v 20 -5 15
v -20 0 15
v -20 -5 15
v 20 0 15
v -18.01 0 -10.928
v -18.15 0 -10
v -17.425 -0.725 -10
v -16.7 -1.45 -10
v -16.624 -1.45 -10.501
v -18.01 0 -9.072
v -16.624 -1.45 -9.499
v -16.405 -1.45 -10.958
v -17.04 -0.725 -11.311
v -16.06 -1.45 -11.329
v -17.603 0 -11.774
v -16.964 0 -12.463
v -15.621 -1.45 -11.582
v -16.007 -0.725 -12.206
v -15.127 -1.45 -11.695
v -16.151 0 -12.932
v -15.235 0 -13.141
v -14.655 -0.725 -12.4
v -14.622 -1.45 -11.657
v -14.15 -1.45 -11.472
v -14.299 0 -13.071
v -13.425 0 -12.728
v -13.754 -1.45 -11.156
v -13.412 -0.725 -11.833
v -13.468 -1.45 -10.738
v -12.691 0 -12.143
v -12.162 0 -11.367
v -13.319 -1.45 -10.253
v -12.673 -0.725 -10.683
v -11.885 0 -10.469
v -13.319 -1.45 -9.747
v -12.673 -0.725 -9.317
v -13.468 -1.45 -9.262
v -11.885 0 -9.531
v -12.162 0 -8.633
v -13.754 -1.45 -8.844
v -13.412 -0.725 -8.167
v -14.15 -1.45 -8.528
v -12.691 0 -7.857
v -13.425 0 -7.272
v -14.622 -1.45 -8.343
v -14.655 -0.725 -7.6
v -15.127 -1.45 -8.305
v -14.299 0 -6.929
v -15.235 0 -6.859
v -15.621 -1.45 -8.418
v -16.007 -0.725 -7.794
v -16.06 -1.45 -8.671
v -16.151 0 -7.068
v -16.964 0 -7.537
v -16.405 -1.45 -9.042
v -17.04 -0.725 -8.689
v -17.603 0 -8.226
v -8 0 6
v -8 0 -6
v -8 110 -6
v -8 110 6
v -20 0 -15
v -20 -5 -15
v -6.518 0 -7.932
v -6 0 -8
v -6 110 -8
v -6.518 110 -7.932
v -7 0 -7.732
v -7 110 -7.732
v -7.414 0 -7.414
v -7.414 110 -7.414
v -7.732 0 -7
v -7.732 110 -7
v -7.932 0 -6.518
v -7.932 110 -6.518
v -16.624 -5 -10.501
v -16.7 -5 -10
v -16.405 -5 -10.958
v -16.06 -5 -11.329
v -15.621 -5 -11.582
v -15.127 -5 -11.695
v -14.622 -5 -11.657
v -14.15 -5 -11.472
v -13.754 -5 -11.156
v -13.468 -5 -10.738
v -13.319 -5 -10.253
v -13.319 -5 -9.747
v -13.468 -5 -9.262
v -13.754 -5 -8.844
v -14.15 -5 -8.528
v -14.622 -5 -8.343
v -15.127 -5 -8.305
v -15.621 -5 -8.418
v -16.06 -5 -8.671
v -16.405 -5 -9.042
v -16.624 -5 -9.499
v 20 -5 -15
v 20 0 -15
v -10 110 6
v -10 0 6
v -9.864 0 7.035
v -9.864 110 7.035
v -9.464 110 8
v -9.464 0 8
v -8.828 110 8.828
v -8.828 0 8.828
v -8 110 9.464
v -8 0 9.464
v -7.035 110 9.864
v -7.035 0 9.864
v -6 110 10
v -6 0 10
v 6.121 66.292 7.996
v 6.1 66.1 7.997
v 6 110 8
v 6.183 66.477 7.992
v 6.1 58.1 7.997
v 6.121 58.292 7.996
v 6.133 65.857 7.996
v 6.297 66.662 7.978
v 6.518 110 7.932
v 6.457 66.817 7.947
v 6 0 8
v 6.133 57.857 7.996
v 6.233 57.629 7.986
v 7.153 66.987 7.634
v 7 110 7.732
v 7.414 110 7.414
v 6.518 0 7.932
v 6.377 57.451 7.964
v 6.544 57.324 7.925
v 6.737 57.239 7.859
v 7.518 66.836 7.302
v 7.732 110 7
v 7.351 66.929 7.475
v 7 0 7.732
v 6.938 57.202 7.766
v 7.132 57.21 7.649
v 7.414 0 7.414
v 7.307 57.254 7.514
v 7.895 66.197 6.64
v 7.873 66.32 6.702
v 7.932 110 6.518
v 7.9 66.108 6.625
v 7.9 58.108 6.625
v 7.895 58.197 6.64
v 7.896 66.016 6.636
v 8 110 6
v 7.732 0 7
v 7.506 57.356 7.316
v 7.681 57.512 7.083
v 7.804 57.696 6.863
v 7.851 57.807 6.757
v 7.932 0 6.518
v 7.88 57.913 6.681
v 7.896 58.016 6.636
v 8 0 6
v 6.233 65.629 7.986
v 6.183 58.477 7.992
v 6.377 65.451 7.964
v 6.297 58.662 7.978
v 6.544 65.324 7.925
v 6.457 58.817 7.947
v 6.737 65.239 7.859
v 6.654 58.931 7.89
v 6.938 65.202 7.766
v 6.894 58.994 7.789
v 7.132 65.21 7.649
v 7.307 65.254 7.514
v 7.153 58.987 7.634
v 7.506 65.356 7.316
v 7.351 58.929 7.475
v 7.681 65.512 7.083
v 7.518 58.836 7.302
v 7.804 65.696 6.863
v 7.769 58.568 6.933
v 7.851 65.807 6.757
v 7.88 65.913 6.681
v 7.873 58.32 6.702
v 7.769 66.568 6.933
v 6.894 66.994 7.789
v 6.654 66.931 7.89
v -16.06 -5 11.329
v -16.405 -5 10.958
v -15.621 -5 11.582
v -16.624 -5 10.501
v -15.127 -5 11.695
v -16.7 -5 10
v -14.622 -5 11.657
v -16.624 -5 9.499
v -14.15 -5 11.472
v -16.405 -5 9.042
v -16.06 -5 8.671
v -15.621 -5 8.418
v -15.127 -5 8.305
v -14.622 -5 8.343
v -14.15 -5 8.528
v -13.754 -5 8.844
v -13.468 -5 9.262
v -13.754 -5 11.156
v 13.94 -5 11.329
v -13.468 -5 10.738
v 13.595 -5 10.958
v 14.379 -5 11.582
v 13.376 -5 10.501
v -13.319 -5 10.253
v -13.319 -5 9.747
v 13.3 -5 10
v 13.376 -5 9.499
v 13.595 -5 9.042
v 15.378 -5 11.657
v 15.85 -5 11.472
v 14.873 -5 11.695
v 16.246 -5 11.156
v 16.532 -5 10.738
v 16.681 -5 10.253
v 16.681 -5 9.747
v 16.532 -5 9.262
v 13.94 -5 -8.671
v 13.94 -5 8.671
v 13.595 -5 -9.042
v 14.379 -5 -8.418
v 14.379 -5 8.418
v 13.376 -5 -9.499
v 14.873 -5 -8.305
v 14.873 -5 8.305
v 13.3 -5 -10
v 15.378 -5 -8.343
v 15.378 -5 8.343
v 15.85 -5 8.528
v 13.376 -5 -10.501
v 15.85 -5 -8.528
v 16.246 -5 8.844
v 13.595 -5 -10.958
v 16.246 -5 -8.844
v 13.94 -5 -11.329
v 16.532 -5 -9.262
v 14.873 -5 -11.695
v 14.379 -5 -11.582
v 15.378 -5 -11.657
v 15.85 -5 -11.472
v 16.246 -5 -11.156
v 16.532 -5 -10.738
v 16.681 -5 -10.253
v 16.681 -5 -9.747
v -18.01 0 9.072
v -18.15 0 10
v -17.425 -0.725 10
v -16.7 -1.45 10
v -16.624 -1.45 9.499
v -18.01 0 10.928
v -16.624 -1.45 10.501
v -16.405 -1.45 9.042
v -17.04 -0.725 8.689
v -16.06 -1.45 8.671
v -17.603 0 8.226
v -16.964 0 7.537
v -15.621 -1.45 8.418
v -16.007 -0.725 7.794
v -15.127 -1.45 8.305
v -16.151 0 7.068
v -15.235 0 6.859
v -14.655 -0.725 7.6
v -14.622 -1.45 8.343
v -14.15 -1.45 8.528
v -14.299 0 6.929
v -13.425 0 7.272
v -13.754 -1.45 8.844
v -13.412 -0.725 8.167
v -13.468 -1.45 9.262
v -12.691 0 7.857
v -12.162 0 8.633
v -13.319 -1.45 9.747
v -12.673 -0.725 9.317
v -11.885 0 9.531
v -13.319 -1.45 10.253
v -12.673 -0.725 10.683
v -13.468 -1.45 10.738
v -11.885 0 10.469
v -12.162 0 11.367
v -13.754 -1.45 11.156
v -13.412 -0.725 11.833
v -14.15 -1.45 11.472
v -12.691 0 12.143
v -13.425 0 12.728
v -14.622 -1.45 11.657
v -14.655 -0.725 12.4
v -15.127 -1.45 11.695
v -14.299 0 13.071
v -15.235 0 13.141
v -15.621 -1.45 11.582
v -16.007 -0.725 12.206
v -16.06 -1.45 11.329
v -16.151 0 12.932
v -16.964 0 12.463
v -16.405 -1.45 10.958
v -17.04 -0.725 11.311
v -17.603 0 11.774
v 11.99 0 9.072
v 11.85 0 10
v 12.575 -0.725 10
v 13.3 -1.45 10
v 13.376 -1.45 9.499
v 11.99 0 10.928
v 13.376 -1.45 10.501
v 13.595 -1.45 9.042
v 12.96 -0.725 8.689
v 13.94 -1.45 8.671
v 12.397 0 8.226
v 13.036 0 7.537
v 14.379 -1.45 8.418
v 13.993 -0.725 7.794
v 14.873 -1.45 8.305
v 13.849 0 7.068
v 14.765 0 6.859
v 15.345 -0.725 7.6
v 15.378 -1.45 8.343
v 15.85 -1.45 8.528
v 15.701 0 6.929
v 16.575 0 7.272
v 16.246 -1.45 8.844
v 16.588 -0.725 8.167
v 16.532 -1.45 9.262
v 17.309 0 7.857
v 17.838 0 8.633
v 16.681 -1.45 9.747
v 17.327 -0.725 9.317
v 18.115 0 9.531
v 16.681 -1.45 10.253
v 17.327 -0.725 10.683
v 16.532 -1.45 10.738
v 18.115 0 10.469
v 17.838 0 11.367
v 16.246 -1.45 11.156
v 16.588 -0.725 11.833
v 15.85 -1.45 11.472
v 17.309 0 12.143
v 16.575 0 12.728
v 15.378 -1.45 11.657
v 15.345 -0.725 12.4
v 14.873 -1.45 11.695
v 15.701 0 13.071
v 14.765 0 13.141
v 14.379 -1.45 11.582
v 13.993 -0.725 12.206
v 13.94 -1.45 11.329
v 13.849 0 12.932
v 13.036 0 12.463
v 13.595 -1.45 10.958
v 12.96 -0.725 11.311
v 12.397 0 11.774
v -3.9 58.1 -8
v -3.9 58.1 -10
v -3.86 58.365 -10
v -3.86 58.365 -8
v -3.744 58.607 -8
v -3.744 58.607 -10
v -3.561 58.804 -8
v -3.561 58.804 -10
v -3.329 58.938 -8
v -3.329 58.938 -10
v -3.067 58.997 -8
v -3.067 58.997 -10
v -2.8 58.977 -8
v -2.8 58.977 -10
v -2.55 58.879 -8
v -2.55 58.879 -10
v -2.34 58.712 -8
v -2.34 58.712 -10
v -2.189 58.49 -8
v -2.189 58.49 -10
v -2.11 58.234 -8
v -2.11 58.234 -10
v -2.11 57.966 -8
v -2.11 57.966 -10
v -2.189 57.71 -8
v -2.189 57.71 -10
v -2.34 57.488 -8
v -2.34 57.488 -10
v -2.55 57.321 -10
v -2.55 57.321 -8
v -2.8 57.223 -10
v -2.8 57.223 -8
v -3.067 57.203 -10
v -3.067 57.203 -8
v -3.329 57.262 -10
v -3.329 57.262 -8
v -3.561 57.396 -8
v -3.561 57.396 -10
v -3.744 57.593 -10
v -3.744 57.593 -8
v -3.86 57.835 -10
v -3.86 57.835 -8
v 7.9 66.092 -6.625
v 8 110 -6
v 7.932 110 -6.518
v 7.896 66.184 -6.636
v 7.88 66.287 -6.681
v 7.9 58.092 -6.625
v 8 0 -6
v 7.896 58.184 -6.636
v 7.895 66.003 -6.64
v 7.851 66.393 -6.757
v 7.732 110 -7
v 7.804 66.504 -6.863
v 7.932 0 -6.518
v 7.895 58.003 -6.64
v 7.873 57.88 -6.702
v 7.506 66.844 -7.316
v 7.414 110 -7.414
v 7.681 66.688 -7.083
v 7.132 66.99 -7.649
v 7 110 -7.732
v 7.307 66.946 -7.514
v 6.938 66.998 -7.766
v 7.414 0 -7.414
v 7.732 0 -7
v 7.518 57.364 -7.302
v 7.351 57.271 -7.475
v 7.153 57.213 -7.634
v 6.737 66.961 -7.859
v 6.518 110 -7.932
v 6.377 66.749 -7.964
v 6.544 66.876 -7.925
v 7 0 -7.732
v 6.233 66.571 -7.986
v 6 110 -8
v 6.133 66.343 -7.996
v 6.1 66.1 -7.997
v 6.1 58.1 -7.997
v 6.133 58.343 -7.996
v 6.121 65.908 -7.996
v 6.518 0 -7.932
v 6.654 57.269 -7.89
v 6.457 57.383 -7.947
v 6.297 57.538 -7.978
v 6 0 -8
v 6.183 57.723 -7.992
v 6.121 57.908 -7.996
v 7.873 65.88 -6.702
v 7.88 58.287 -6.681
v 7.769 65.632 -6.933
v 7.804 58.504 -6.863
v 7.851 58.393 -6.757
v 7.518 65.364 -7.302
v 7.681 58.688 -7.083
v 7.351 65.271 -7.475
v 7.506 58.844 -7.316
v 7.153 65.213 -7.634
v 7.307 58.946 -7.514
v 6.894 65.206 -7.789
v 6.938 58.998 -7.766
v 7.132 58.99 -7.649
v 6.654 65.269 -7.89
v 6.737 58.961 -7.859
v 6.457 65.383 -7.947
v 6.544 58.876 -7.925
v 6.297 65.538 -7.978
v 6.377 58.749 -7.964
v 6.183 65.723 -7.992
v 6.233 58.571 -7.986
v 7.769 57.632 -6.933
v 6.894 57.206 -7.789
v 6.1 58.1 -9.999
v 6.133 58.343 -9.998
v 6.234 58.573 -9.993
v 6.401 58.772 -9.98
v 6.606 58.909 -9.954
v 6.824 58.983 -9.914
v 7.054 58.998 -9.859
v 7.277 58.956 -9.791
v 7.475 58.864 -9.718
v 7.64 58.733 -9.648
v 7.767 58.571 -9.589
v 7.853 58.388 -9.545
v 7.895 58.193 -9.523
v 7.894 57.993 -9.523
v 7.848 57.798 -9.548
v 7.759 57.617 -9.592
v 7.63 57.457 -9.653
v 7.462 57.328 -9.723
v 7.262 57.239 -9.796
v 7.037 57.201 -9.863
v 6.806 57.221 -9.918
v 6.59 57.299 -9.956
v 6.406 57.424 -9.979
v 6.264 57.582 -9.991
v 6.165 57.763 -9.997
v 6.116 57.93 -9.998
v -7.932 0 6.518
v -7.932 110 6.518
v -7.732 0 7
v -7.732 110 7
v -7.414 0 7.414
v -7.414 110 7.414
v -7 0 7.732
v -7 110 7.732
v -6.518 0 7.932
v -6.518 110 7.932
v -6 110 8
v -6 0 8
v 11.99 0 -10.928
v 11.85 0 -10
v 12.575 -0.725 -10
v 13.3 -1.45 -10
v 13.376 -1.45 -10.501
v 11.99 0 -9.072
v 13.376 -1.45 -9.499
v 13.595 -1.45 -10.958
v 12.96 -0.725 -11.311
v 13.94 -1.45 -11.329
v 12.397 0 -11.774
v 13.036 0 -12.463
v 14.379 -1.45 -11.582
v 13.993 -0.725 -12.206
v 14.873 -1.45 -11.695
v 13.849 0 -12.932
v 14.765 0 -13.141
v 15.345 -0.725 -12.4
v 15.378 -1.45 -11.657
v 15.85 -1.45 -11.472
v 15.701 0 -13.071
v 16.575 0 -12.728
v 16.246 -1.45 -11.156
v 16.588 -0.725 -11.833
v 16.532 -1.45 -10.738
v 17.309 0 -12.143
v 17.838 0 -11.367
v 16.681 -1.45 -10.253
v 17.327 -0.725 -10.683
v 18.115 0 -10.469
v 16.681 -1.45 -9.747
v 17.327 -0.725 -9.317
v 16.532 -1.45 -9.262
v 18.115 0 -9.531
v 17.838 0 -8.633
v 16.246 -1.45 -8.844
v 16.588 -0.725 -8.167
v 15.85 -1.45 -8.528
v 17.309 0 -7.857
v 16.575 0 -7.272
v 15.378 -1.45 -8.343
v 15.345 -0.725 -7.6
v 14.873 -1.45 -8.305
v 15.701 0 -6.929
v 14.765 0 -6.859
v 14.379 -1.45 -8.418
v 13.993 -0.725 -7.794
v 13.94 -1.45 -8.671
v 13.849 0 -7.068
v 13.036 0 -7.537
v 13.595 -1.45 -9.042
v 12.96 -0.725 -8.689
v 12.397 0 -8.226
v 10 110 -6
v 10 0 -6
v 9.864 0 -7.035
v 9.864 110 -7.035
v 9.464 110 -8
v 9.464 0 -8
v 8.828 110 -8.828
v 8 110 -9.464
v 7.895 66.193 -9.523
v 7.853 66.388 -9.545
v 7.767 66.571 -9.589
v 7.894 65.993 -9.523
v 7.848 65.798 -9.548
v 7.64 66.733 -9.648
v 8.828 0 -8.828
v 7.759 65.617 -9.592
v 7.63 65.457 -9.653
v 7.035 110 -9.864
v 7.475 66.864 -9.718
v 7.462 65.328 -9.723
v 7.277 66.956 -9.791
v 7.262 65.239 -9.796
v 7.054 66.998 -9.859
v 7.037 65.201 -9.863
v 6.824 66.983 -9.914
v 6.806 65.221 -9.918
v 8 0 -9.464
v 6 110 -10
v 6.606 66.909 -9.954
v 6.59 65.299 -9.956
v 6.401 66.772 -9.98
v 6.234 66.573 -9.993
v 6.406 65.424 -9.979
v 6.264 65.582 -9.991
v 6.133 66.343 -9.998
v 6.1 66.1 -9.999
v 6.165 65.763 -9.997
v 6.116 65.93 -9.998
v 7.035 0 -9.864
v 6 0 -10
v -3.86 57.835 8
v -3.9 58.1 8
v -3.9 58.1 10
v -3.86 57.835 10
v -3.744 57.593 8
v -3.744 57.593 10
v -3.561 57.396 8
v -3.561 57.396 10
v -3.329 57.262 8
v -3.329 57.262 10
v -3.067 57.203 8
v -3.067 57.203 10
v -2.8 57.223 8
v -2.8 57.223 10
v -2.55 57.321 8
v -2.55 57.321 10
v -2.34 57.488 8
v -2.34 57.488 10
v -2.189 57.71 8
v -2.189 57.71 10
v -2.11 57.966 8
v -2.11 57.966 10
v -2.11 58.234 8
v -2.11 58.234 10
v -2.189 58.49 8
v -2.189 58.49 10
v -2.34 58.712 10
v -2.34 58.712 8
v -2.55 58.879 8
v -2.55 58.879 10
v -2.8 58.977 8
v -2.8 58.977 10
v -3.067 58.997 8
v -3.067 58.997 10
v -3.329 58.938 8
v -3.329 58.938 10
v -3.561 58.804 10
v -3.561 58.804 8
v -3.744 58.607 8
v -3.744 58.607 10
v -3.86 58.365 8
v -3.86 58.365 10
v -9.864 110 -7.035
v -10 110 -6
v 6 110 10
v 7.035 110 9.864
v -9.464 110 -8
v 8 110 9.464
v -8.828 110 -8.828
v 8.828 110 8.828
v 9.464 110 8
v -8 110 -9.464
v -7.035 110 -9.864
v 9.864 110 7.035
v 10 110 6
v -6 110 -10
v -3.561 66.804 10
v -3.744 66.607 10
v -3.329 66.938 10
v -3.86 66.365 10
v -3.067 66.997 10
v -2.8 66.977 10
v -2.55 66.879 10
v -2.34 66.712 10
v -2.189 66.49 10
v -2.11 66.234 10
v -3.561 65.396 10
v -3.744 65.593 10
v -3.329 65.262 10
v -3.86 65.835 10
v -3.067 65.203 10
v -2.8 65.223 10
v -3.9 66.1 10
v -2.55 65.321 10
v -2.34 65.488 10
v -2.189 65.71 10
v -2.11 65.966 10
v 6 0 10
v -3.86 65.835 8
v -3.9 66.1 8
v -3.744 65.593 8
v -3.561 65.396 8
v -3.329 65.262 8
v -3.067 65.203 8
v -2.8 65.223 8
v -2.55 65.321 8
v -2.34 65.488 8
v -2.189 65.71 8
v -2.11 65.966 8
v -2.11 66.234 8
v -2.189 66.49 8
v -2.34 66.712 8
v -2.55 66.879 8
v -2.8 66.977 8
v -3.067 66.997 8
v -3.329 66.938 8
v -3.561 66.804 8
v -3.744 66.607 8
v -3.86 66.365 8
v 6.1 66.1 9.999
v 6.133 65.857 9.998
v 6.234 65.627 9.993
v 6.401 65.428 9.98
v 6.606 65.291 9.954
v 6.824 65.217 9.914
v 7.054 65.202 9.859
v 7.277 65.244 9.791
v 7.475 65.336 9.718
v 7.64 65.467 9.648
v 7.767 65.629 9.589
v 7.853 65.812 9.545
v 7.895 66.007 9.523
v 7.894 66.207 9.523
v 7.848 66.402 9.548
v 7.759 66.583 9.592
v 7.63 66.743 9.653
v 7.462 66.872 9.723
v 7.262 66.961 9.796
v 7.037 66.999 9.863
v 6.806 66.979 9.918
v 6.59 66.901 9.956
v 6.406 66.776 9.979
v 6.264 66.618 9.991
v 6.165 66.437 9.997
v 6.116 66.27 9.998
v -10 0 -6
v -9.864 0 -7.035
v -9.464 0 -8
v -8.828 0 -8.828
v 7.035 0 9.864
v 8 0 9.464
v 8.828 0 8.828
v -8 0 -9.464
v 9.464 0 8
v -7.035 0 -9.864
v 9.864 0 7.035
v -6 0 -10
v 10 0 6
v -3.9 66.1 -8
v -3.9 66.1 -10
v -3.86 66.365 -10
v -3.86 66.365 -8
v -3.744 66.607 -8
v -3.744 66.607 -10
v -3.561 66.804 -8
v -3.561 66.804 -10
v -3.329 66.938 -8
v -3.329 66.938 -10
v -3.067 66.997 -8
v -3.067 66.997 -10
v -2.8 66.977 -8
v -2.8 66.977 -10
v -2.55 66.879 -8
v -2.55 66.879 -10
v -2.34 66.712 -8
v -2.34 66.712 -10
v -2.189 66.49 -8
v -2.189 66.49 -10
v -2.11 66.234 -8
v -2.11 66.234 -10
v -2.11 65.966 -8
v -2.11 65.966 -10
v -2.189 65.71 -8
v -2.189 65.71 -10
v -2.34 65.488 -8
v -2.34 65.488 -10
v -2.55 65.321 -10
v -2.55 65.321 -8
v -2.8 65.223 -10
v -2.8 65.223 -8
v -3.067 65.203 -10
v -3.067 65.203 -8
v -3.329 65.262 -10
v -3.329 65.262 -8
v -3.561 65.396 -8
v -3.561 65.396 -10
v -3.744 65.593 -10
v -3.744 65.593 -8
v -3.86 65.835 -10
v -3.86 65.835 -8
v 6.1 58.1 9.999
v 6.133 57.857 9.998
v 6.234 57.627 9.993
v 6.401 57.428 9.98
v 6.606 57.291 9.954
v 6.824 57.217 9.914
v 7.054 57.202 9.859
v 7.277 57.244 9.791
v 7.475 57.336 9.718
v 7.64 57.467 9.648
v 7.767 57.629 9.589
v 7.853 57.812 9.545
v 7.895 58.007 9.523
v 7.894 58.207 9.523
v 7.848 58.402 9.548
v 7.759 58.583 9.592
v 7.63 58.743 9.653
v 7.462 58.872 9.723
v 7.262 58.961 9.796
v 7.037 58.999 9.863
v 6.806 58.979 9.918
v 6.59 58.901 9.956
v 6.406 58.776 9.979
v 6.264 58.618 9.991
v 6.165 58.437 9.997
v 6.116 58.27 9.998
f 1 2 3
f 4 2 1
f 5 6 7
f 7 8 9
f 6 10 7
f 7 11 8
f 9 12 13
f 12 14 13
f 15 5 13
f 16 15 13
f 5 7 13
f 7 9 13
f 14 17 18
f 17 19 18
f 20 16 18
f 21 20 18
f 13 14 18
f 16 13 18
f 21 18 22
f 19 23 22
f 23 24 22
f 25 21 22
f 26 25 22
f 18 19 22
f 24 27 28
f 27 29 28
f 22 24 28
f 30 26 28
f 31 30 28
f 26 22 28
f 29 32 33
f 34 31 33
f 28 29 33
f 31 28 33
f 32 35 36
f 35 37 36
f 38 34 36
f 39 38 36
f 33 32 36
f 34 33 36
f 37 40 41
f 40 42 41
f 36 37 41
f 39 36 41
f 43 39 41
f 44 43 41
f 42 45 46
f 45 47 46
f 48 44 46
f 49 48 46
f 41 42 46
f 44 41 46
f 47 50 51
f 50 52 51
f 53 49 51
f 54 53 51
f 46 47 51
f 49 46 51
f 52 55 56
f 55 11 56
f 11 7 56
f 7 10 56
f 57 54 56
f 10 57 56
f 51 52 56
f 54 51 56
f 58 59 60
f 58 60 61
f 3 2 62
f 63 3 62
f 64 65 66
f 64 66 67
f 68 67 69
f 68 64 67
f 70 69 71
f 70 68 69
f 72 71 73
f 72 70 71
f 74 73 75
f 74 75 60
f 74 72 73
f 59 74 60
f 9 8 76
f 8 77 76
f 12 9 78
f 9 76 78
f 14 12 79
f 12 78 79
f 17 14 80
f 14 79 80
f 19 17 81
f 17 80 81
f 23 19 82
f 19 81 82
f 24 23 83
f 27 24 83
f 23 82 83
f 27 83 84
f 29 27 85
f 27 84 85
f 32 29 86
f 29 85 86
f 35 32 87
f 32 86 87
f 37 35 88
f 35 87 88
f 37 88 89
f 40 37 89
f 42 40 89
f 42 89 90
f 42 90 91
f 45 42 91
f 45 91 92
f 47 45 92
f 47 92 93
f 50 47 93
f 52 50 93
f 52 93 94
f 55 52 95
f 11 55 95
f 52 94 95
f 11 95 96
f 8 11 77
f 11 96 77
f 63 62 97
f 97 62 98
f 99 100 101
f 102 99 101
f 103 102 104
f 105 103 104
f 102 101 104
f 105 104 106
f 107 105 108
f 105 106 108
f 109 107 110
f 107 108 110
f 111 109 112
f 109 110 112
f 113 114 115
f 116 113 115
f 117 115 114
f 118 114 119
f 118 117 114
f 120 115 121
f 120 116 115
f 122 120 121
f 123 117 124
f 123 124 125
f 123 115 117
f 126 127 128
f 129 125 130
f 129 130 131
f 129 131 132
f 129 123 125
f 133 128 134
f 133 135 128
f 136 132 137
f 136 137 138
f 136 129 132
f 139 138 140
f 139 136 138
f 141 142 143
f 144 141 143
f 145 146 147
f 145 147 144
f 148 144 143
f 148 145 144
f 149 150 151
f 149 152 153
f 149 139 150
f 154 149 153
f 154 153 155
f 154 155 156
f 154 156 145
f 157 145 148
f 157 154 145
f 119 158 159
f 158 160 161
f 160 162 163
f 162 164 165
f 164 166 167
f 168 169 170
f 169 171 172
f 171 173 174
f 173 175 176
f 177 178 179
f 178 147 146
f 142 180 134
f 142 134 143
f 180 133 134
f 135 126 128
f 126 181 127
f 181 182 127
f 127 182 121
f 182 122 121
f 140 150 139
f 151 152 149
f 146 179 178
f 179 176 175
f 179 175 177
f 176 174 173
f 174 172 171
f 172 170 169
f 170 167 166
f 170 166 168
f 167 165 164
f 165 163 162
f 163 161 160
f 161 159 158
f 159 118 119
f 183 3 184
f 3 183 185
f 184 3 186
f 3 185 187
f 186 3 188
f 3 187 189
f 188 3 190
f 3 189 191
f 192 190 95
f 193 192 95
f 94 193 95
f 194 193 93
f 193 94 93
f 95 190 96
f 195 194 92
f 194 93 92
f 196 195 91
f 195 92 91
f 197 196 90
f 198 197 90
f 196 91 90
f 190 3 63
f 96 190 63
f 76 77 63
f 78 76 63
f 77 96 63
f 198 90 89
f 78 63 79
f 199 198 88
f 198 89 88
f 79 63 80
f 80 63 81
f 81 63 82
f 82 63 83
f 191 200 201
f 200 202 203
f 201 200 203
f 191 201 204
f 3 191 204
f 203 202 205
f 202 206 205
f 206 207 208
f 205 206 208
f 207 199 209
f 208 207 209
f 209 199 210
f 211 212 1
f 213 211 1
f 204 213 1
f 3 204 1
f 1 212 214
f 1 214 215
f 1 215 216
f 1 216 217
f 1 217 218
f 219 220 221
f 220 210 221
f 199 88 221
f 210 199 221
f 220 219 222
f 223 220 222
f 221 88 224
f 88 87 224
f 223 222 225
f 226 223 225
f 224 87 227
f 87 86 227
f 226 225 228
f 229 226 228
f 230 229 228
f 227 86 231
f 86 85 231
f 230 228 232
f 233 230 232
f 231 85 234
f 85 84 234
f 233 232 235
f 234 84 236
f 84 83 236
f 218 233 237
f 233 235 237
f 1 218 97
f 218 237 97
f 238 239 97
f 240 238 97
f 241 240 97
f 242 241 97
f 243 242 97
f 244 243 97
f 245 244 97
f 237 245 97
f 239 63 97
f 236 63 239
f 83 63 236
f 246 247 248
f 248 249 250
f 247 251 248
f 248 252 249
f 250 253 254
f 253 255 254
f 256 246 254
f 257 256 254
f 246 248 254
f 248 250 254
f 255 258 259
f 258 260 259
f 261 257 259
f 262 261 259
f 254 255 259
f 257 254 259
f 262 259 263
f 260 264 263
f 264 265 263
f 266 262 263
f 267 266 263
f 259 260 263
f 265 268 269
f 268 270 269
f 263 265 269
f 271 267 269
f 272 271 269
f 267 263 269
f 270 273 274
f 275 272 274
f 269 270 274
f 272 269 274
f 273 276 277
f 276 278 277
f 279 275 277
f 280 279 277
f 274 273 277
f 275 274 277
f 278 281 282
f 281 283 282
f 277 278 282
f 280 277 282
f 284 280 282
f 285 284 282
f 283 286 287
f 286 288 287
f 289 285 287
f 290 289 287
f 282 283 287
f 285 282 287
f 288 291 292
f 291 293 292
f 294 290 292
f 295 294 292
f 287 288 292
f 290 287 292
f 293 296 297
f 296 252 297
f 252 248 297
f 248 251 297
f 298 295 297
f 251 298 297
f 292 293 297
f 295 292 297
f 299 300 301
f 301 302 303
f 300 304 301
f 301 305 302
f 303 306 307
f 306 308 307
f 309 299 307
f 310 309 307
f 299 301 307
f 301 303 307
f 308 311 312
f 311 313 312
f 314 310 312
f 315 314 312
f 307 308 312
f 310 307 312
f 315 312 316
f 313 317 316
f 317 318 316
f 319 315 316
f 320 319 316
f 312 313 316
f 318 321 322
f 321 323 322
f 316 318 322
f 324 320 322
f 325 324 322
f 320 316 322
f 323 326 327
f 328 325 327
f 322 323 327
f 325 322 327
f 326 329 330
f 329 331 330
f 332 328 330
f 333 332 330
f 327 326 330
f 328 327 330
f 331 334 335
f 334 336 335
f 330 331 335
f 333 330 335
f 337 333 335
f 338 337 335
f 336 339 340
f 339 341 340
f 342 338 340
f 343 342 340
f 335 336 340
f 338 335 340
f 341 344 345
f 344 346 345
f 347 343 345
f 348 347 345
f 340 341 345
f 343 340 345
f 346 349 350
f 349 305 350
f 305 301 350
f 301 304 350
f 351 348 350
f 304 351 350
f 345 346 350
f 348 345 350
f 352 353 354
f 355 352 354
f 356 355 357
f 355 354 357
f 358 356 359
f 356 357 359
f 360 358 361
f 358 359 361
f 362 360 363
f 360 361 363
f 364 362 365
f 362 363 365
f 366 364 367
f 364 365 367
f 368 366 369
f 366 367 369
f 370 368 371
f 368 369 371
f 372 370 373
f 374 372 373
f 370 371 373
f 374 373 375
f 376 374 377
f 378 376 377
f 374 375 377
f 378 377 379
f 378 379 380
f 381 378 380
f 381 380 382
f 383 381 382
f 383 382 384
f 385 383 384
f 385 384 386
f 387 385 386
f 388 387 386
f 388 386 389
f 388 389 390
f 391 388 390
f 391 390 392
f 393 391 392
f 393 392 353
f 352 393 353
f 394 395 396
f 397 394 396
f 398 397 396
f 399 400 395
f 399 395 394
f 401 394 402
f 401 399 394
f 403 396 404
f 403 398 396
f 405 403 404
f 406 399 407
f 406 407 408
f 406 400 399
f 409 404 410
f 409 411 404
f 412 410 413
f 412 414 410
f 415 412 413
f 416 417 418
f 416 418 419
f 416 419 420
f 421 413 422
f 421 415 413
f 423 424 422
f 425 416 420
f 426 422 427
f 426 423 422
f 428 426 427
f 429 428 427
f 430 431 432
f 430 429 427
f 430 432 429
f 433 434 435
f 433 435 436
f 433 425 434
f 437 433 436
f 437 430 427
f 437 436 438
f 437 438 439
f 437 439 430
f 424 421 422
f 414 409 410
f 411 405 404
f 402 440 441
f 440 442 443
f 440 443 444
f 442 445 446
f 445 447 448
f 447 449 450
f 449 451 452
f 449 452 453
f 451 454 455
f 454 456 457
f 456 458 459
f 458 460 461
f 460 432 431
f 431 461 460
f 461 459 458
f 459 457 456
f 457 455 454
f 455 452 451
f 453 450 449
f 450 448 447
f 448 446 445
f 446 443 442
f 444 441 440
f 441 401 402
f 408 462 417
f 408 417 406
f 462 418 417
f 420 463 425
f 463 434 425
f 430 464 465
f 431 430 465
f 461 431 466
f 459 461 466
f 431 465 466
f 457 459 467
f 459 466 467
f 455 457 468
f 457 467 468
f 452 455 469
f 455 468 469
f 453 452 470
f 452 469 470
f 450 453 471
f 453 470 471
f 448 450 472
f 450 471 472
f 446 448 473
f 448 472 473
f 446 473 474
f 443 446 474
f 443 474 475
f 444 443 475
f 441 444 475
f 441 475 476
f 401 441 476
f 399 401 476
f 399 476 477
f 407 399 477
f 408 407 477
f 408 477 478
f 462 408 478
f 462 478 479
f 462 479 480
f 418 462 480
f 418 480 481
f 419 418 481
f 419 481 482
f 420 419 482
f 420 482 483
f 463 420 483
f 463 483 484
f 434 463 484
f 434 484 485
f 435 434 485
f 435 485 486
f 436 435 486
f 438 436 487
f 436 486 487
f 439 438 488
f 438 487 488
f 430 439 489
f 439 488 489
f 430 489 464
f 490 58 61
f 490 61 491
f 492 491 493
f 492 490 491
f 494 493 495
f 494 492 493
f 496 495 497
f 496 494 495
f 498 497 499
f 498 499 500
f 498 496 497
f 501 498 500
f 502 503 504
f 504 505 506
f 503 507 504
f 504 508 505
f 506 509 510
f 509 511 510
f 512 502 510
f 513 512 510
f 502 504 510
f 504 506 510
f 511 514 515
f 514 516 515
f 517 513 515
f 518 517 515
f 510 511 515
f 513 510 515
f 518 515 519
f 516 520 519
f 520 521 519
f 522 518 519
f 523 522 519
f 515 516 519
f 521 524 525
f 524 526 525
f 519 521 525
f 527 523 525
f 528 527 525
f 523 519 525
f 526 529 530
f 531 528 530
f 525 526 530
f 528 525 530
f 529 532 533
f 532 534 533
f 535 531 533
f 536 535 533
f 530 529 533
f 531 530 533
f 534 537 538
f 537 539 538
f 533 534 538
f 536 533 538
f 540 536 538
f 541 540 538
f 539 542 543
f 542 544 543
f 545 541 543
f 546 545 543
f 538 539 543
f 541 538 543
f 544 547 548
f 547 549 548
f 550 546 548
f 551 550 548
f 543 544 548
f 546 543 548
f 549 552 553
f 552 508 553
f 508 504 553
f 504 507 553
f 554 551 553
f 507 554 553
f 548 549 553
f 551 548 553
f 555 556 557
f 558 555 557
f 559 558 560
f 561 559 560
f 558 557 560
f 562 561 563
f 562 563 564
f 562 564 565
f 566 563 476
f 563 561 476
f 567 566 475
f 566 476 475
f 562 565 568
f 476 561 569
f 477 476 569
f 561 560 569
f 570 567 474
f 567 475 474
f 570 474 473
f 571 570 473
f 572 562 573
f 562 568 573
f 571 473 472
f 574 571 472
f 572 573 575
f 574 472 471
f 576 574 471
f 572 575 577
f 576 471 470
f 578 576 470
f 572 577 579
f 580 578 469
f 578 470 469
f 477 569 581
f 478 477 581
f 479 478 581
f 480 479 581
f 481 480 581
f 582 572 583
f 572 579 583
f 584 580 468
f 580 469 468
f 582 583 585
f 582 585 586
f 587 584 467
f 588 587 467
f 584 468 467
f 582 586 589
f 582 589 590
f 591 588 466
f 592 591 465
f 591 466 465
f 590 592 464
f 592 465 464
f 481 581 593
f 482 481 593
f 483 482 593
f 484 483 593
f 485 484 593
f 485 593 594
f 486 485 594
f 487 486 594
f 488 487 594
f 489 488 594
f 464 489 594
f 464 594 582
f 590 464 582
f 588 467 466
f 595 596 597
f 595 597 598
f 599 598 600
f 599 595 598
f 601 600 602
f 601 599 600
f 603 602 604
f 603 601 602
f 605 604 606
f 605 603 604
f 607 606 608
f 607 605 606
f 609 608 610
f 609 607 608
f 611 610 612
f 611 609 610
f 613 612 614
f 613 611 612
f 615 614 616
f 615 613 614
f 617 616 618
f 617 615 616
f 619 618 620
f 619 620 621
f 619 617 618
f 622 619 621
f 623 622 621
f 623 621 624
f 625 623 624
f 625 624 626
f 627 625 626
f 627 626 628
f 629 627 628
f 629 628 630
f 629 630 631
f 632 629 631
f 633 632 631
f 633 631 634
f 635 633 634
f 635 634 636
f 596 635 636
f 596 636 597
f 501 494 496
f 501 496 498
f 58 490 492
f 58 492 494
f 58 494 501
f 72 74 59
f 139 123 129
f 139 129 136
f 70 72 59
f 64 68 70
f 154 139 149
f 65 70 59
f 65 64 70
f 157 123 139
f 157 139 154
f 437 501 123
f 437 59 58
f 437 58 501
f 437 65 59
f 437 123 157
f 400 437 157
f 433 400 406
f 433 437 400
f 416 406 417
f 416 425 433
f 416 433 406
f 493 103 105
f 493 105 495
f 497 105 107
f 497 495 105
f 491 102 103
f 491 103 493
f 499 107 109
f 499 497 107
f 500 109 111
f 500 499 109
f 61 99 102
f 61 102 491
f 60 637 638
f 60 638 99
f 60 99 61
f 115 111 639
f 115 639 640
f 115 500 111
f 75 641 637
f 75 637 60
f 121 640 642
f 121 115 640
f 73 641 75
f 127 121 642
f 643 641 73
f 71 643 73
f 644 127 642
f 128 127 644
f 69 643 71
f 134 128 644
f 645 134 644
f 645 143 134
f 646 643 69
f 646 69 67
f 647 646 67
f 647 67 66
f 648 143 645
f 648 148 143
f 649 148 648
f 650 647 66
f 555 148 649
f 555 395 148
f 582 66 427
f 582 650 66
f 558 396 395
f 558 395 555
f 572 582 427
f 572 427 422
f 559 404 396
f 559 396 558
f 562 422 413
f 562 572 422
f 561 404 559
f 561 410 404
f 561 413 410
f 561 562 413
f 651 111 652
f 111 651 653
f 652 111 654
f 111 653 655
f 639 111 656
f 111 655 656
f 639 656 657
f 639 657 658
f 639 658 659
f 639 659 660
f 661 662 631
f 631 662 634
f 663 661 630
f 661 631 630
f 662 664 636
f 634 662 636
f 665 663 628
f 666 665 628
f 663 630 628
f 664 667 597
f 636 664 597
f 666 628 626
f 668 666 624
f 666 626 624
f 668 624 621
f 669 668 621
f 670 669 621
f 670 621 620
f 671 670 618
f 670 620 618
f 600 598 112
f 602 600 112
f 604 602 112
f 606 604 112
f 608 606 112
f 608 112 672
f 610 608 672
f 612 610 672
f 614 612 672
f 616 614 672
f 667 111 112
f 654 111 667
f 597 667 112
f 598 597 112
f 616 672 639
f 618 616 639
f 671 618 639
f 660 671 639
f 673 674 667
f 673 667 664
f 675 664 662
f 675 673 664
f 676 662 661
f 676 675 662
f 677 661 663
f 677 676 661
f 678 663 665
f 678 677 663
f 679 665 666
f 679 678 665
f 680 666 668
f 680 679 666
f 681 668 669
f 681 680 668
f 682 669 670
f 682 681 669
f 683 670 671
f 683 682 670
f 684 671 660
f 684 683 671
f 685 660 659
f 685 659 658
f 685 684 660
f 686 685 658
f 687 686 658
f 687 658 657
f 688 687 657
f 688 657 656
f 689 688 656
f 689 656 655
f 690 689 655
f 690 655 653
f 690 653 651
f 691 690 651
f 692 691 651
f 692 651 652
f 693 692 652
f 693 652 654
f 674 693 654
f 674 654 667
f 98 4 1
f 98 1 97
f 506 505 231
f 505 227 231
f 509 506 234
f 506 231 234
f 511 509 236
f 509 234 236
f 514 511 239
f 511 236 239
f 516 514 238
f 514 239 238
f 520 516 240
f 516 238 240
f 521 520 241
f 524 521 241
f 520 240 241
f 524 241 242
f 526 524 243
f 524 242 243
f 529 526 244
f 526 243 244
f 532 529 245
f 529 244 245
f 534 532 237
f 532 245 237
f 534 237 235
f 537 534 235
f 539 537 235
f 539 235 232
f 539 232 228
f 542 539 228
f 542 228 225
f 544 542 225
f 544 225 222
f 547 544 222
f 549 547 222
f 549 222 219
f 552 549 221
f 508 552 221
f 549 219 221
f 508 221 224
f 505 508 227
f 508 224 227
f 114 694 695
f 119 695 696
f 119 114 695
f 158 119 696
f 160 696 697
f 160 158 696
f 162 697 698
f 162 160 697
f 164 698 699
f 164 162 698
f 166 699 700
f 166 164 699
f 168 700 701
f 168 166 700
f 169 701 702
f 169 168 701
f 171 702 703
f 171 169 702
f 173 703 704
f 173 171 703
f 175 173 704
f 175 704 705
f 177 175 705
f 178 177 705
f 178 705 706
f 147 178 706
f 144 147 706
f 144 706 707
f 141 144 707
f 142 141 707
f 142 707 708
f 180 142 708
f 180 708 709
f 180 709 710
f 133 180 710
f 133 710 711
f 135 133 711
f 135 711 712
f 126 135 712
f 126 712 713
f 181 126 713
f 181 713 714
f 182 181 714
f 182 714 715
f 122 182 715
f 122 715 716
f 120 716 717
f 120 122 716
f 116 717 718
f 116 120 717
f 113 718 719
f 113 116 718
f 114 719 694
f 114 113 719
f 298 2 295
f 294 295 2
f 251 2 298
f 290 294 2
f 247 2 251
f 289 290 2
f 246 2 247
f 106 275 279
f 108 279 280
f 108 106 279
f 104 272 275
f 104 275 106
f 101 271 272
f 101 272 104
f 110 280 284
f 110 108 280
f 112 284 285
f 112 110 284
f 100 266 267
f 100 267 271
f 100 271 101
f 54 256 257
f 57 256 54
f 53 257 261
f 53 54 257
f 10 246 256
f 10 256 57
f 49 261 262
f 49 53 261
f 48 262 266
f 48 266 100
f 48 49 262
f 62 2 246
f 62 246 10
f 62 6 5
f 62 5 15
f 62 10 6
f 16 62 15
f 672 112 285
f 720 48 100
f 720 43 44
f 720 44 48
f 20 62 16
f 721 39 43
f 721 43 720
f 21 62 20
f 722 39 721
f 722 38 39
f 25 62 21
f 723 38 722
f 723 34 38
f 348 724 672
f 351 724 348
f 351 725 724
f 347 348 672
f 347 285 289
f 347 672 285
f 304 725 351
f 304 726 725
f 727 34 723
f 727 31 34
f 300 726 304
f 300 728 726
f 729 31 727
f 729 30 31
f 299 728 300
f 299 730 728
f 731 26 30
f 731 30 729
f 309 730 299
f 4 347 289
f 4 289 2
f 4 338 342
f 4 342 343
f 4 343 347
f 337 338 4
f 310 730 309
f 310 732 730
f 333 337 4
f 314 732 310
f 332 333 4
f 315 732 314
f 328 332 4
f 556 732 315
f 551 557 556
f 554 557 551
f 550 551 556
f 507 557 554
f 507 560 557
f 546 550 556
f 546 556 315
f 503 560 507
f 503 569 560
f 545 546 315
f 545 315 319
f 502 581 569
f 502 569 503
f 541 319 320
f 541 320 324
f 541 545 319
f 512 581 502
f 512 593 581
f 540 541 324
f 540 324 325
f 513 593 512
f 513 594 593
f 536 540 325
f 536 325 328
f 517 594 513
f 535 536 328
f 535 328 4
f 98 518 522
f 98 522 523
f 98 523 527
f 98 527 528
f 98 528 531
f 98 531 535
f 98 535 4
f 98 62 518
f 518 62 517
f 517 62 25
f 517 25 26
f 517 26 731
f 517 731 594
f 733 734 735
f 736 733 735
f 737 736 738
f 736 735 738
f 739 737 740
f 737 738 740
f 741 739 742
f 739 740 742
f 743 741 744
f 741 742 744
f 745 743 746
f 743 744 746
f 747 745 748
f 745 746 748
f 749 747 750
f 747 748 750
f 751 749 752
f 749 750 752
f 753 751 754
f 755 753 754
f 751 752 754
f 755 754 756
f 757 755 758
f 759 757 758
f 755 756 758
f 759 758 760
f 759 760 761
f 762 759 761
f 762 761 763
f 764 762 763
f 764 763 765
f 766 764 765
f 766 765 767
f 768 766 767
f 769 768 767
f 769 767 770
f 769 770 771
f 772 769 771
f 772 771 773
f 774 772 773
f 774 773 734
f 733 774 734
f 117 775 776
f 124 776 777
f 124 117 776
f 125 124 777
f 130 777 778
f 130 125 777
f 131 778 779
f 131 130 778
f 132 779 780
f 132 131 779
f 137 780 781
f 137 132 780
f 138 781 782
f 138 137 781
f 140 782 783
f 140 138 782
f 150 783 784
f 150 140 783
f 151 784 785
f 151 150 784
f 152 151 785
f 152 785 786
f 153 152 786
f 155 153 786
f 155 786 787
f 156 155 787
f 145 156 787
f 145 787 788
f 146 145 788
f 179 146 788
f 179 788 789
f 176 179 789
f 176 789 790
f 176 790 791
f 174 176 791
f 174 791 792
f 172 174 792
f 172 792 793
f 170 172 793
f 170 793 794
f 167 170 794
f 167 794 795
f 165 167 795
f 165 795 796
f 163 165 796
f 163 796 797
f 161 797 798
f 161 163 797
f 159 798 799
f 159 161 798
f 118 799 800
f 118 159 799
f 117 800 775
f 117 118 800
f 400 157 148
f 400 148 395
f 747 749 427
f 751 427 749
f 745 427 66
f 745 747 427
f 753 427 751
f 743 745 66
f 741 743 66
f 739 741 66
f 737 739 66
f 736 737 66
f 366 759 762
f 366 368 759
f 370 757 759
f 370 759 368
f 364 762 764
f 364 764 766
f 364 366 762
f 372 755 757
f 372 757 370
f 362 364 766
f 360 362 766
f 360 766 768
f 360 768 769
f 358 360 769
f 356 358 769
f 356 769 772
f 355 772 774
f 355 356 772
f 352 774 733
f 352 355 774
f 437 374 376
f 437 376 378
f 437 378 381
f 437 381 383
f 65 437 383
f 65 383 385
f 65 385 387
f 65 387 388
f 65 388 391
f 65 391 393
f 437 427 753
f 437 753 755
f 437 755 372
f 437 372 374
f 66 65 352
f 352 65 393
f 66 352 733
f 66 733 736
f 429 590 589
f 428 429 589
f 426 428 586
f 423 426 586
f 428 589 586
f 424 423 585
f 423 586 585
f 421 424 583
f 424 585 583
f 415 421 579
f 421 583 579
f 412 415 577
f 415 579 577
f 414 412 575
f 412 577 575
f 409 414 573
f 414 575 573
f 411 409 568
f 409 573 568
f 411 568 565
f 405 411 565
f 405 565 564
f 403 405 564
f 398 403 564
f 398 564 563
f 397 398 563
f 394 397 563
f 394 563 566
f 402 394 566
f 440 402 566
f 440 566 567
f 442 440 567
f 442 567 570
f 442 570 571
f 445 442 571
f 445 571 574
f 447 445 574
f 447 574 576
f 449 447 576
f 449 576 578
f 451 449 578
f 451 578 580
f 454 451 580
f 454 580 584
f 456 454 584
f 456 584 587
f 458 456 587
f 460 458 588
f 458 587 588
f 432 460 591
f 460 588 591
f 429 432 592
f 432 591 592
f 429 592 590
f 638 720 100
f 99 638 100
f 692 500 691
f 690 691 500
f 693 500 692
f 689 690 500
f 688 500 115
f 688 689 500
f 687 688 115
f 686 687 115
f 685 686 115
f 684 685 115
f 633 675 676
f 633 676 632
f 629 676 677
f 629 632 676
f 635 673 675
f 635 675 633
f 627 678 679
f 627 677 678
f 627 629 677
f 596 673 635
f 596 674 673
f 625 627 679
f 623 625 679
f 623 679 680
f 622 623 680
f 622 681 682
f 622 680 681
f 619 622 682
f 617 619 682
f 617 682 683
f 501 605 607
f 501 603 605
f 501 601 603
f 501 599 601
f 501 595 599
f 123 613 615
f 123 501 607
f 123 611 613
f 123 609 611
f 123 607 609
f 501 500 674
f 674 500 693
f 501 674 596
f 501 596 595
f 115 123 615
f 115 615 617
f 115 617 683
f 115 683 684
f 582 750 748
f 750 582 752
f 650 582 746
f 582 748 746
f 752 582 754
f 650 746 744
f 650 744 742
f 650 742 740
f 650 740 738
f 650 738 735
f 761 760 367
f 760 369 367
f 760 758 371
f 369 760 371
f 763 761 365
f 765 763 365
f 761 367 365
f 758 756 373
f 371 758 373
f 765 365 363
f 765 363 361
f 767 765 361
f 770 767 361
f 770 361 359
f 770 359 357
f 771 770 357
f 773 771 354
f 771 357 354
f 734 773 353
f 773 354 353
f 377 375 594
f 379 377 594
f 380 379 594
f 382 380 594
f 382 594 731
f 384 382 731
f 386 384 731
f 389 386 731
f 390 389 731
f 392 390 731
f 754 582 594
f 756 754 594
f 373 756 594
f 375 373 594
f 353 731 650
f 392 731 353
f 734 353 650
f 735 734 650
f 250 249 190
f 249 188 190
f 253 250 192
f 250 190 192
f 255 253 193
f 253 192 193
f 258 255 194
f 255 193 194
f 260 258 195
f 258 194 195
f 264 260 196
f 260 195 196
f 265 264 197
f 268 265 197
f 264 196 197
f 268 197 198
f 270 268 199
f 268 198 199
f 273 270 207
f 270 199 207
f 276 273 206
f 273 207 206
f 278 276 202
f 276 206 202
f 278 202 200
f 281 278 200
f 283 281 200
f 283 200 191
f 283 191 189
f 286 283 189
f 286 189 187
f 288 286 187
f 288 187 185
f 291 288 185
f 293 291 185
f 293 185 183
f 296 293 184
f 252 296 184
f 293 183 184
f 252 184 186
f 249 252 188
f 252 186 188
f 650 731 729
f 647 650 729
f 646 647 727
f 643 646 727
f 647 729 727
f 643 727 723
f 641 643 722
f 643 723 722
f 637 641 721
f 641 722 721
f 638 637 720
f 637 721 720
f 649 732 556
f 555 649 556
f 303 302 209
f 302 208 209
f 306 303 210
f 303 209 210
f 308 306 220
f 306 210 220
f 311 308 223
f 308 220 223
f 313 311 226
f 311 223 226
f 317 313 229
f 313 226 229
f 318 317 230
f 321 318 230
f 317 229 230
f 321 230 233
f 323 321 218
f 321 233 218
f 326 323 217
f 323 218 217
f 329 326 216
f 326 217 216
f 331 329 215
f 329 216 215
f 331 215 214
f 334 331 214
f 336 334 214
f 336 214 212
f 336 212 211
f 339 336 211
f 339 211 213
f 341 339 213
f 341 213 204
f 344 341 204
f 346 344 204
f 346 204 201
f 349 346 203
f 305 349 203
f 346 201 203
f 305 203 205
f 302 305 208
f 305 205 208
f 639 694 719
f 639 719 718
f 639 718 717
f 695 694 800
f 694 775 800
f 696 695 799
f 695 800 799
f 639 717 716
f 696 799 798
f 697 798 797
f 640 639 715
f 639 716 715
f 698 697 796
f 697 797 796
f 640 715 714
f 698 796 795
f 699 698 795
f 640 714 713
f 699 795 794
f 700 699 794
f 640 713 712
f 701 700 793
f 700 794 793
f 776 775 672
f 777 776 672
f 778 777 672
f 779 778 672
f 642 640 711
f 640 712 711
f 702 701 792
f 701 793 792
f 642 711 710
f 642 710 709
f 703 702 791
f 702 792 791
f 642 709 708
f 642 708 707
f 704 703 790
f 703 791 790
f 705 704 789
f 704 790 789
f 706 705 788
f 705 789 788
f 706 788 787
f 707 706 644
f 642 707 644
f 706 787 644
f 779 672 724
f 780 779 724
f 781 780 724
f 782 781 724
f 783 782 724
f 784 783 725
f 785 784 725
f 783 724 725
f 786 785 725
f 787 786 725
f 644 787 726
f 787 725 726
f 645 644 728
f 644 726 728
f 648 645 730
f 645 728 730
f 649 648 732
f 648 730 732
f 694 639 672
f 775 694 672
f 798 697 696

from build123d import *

# Parameters (mm, degrees)
SQUARE_TUBE_20_X_20_X_2_1_DEPTH                     = 110
SKETCH2_W                                           = 40
SKETCH2_H                                           = 30
BOSS_EXTRUDE1_DEPTH                                 = 5
CSK_FOR_M3_COUNTERSUNK_FLAT_HEAD_SCREW1_D           = 3.4
CSK_FOR_M3_COUNTERSUNK_FLAT_HEAD_SCREW1_DEPTH       = 30
CSK_FOR_M3_COUNTERSUNK_FLAT_HEAD_SCREW1_CSINK_D     = 6.3
CSK_FOR_M3_COUNTERSUNK_FLAT_HEAD_SCREW1_CSINK_ANGLE = 90
CSK_FOR_M3_COUNTERSUNK_FLAT_HEAD_SCREW1_TIP         = 1.021463052
SKETCH5_R                                           = 0.9
CUT_EXTRUDE1_DEPTH                                  = 5
CUT_EXTRUDE2_START                                  = -5
SKETCH6_R                                           = 0.9
CUT_EXTRUDE2_DEPTH                                  = 5


with BuildPart() as part:
    # Sketch1 → Square tube 20 X 20 X 2(1) (new body)
    with BuildSketch(Plane(origin=(0, 0, 0), x_dir=(1, 0, 0), z_dir=(0, 1, 0))):
        with BuildLine():
            Line((-6, -10), (6, -10))
            ThreePointArc((6, -10), (8.828427125, -8.828427125), (10, -6))
            Line((10, -6), (10, 6))
            ThreePointArc((10, 6), (8.828427125, 8.828427125), (6, 10))
            Line((6, 10), (-6, 10))
            ThreePointArc((-6, 10), (-8.828427125, 8.828427125), (-10, 6))
            Line((-10, 6), (-10, -6))
            ThreePointArc((-10, -6), (-8.828427125, -8.828427125), (-6, -10))
        make_face()
        with BuildLine():
            Line((-6, -8), (6, -8))
            ThreePointArc((6, -8), (7.414213562, -7.414213562), (8, -6))
            Line((8, -6), (8, 6))
            ThreePointArc((8, 6), (7.414213562, 7.414213562), (6, 8))
            Line((6, 8), (-6, 8))
            ThreePointArc((-6, 8), (-7.414213562, 7.414213562), (-8, 6))
            Line((-8, 6), (-8, -6))
            ThreePointArc((-8, -6), (-7.414213562, -7.414213562), (-6, -8))
        make_face(mode=Mode.SUBTRACT)
    extrude(amount=SQUARE_TUBE_20_X_20_X_2_1_DEPTH)

    # Sketch2 → Boss-Extrude1 (add)
    with BuildSketch(Plane(origin=(0, 0, 0), x_dir=(1, 0, 0), z_dir=(0, 1, 0))):
        Rectangle(SKETCH2_W, SKETCH2_H)
    extrude(amount=-BOSS_EXTRUDE1_DEPTH)

    # CSK for M3 Countersunk Flat Head Screw1
    with Locations(Plane(origin=(0, 0, 0), x_dir=(1, 0, 0), z_dir=(0, 1, 0))):
        with Locations((15, 10), (-15, 10), (-15, -10), (15, -10)):
            CounterSinkHole(CSK_FOR_M3_COUNTERSUNK_FLAT_HEAD_SCREW1_D / 2, CSK_FOR_M3_COUNTERSUNK_FLAT_HEAD_SCREW1_CSINK_D / 2, depth=CSK_FOR_M3_COUNTERSUNK_FLAT_HEAD_SCREW1_DEPTH, counter_sink_angle=CSK_FOR_M3_COUNTERSUNK_FLAT_HEAD_SCREW1_CSINK_ANGLE)
            with Locations((0, 0, -(CSK_FOR_M3_COUNTERSUNK_FLAT_HEAD_SCREW1_DEPTH + CSK_FOR_M3_COUNTERSUNK_FLAT_HEAD_SCREW1_TIP / 2))):  # 118° drill point
                Cone(0, CSK_FOR_M3_COUNTERSUNK_FLAT_HEAD_SCREW1_D / 2, CSK_FOR_M3_COUNTERSUNK_FLAT_HEAD_SCREW1_TIP, mode=Mode.SUBTRACT)

    # Sketch5 → Cut-Extrude1 (cut)
    with BuildSketch(Plane(origin=(0, 0, -10), x_dir=(-1, 0, 0), z_dir=(0, 0, -1))):
        with Locations((2.999999983, 66.1)):
            Circle(SKETCH5_R)
        with Locations((2.999999983, 58.1)):
            Circle(SKETCH5_R)
        with Locations((-7.000000017, 58.1)):
            Circle(SKETCH5_R)
        with Locations((-7.000000017, 66.1)):
            Circle(SKETCH5_R)
    extrude(amount=-CUT_EXTRUDE1_DEPTH, mode=Mode.SUBTRACT)

    # Sketch6 → Cut-Extrude2 (cut)
    with BuildSketch(Plane.XY.offset(10).offset(CUT_EXTRUDE2_START)):
        with Locations(Location((-2.999999994, 66.1, 0), (0, 0, 180))):
            Circle(SKETCH6_R)
        with Locations(Location((7.000000006, 66.1, 0), (0, 0, 180))):
            Circle(SKETCH6_R)
        with Locations(Location((7.000000006, 58.1, 0), (0, 0, 180))):
            Circle(SKETCH6_R)
        with Locations(Location((-2.999999994, 58.1, 0), (0, 0, 180))):
            Circle(SKETCH6_R)
    extrude(amount=CUT_EXTRUDE2_DEPTH, mode=Mode.SUBTRACT)


solid = part.part
